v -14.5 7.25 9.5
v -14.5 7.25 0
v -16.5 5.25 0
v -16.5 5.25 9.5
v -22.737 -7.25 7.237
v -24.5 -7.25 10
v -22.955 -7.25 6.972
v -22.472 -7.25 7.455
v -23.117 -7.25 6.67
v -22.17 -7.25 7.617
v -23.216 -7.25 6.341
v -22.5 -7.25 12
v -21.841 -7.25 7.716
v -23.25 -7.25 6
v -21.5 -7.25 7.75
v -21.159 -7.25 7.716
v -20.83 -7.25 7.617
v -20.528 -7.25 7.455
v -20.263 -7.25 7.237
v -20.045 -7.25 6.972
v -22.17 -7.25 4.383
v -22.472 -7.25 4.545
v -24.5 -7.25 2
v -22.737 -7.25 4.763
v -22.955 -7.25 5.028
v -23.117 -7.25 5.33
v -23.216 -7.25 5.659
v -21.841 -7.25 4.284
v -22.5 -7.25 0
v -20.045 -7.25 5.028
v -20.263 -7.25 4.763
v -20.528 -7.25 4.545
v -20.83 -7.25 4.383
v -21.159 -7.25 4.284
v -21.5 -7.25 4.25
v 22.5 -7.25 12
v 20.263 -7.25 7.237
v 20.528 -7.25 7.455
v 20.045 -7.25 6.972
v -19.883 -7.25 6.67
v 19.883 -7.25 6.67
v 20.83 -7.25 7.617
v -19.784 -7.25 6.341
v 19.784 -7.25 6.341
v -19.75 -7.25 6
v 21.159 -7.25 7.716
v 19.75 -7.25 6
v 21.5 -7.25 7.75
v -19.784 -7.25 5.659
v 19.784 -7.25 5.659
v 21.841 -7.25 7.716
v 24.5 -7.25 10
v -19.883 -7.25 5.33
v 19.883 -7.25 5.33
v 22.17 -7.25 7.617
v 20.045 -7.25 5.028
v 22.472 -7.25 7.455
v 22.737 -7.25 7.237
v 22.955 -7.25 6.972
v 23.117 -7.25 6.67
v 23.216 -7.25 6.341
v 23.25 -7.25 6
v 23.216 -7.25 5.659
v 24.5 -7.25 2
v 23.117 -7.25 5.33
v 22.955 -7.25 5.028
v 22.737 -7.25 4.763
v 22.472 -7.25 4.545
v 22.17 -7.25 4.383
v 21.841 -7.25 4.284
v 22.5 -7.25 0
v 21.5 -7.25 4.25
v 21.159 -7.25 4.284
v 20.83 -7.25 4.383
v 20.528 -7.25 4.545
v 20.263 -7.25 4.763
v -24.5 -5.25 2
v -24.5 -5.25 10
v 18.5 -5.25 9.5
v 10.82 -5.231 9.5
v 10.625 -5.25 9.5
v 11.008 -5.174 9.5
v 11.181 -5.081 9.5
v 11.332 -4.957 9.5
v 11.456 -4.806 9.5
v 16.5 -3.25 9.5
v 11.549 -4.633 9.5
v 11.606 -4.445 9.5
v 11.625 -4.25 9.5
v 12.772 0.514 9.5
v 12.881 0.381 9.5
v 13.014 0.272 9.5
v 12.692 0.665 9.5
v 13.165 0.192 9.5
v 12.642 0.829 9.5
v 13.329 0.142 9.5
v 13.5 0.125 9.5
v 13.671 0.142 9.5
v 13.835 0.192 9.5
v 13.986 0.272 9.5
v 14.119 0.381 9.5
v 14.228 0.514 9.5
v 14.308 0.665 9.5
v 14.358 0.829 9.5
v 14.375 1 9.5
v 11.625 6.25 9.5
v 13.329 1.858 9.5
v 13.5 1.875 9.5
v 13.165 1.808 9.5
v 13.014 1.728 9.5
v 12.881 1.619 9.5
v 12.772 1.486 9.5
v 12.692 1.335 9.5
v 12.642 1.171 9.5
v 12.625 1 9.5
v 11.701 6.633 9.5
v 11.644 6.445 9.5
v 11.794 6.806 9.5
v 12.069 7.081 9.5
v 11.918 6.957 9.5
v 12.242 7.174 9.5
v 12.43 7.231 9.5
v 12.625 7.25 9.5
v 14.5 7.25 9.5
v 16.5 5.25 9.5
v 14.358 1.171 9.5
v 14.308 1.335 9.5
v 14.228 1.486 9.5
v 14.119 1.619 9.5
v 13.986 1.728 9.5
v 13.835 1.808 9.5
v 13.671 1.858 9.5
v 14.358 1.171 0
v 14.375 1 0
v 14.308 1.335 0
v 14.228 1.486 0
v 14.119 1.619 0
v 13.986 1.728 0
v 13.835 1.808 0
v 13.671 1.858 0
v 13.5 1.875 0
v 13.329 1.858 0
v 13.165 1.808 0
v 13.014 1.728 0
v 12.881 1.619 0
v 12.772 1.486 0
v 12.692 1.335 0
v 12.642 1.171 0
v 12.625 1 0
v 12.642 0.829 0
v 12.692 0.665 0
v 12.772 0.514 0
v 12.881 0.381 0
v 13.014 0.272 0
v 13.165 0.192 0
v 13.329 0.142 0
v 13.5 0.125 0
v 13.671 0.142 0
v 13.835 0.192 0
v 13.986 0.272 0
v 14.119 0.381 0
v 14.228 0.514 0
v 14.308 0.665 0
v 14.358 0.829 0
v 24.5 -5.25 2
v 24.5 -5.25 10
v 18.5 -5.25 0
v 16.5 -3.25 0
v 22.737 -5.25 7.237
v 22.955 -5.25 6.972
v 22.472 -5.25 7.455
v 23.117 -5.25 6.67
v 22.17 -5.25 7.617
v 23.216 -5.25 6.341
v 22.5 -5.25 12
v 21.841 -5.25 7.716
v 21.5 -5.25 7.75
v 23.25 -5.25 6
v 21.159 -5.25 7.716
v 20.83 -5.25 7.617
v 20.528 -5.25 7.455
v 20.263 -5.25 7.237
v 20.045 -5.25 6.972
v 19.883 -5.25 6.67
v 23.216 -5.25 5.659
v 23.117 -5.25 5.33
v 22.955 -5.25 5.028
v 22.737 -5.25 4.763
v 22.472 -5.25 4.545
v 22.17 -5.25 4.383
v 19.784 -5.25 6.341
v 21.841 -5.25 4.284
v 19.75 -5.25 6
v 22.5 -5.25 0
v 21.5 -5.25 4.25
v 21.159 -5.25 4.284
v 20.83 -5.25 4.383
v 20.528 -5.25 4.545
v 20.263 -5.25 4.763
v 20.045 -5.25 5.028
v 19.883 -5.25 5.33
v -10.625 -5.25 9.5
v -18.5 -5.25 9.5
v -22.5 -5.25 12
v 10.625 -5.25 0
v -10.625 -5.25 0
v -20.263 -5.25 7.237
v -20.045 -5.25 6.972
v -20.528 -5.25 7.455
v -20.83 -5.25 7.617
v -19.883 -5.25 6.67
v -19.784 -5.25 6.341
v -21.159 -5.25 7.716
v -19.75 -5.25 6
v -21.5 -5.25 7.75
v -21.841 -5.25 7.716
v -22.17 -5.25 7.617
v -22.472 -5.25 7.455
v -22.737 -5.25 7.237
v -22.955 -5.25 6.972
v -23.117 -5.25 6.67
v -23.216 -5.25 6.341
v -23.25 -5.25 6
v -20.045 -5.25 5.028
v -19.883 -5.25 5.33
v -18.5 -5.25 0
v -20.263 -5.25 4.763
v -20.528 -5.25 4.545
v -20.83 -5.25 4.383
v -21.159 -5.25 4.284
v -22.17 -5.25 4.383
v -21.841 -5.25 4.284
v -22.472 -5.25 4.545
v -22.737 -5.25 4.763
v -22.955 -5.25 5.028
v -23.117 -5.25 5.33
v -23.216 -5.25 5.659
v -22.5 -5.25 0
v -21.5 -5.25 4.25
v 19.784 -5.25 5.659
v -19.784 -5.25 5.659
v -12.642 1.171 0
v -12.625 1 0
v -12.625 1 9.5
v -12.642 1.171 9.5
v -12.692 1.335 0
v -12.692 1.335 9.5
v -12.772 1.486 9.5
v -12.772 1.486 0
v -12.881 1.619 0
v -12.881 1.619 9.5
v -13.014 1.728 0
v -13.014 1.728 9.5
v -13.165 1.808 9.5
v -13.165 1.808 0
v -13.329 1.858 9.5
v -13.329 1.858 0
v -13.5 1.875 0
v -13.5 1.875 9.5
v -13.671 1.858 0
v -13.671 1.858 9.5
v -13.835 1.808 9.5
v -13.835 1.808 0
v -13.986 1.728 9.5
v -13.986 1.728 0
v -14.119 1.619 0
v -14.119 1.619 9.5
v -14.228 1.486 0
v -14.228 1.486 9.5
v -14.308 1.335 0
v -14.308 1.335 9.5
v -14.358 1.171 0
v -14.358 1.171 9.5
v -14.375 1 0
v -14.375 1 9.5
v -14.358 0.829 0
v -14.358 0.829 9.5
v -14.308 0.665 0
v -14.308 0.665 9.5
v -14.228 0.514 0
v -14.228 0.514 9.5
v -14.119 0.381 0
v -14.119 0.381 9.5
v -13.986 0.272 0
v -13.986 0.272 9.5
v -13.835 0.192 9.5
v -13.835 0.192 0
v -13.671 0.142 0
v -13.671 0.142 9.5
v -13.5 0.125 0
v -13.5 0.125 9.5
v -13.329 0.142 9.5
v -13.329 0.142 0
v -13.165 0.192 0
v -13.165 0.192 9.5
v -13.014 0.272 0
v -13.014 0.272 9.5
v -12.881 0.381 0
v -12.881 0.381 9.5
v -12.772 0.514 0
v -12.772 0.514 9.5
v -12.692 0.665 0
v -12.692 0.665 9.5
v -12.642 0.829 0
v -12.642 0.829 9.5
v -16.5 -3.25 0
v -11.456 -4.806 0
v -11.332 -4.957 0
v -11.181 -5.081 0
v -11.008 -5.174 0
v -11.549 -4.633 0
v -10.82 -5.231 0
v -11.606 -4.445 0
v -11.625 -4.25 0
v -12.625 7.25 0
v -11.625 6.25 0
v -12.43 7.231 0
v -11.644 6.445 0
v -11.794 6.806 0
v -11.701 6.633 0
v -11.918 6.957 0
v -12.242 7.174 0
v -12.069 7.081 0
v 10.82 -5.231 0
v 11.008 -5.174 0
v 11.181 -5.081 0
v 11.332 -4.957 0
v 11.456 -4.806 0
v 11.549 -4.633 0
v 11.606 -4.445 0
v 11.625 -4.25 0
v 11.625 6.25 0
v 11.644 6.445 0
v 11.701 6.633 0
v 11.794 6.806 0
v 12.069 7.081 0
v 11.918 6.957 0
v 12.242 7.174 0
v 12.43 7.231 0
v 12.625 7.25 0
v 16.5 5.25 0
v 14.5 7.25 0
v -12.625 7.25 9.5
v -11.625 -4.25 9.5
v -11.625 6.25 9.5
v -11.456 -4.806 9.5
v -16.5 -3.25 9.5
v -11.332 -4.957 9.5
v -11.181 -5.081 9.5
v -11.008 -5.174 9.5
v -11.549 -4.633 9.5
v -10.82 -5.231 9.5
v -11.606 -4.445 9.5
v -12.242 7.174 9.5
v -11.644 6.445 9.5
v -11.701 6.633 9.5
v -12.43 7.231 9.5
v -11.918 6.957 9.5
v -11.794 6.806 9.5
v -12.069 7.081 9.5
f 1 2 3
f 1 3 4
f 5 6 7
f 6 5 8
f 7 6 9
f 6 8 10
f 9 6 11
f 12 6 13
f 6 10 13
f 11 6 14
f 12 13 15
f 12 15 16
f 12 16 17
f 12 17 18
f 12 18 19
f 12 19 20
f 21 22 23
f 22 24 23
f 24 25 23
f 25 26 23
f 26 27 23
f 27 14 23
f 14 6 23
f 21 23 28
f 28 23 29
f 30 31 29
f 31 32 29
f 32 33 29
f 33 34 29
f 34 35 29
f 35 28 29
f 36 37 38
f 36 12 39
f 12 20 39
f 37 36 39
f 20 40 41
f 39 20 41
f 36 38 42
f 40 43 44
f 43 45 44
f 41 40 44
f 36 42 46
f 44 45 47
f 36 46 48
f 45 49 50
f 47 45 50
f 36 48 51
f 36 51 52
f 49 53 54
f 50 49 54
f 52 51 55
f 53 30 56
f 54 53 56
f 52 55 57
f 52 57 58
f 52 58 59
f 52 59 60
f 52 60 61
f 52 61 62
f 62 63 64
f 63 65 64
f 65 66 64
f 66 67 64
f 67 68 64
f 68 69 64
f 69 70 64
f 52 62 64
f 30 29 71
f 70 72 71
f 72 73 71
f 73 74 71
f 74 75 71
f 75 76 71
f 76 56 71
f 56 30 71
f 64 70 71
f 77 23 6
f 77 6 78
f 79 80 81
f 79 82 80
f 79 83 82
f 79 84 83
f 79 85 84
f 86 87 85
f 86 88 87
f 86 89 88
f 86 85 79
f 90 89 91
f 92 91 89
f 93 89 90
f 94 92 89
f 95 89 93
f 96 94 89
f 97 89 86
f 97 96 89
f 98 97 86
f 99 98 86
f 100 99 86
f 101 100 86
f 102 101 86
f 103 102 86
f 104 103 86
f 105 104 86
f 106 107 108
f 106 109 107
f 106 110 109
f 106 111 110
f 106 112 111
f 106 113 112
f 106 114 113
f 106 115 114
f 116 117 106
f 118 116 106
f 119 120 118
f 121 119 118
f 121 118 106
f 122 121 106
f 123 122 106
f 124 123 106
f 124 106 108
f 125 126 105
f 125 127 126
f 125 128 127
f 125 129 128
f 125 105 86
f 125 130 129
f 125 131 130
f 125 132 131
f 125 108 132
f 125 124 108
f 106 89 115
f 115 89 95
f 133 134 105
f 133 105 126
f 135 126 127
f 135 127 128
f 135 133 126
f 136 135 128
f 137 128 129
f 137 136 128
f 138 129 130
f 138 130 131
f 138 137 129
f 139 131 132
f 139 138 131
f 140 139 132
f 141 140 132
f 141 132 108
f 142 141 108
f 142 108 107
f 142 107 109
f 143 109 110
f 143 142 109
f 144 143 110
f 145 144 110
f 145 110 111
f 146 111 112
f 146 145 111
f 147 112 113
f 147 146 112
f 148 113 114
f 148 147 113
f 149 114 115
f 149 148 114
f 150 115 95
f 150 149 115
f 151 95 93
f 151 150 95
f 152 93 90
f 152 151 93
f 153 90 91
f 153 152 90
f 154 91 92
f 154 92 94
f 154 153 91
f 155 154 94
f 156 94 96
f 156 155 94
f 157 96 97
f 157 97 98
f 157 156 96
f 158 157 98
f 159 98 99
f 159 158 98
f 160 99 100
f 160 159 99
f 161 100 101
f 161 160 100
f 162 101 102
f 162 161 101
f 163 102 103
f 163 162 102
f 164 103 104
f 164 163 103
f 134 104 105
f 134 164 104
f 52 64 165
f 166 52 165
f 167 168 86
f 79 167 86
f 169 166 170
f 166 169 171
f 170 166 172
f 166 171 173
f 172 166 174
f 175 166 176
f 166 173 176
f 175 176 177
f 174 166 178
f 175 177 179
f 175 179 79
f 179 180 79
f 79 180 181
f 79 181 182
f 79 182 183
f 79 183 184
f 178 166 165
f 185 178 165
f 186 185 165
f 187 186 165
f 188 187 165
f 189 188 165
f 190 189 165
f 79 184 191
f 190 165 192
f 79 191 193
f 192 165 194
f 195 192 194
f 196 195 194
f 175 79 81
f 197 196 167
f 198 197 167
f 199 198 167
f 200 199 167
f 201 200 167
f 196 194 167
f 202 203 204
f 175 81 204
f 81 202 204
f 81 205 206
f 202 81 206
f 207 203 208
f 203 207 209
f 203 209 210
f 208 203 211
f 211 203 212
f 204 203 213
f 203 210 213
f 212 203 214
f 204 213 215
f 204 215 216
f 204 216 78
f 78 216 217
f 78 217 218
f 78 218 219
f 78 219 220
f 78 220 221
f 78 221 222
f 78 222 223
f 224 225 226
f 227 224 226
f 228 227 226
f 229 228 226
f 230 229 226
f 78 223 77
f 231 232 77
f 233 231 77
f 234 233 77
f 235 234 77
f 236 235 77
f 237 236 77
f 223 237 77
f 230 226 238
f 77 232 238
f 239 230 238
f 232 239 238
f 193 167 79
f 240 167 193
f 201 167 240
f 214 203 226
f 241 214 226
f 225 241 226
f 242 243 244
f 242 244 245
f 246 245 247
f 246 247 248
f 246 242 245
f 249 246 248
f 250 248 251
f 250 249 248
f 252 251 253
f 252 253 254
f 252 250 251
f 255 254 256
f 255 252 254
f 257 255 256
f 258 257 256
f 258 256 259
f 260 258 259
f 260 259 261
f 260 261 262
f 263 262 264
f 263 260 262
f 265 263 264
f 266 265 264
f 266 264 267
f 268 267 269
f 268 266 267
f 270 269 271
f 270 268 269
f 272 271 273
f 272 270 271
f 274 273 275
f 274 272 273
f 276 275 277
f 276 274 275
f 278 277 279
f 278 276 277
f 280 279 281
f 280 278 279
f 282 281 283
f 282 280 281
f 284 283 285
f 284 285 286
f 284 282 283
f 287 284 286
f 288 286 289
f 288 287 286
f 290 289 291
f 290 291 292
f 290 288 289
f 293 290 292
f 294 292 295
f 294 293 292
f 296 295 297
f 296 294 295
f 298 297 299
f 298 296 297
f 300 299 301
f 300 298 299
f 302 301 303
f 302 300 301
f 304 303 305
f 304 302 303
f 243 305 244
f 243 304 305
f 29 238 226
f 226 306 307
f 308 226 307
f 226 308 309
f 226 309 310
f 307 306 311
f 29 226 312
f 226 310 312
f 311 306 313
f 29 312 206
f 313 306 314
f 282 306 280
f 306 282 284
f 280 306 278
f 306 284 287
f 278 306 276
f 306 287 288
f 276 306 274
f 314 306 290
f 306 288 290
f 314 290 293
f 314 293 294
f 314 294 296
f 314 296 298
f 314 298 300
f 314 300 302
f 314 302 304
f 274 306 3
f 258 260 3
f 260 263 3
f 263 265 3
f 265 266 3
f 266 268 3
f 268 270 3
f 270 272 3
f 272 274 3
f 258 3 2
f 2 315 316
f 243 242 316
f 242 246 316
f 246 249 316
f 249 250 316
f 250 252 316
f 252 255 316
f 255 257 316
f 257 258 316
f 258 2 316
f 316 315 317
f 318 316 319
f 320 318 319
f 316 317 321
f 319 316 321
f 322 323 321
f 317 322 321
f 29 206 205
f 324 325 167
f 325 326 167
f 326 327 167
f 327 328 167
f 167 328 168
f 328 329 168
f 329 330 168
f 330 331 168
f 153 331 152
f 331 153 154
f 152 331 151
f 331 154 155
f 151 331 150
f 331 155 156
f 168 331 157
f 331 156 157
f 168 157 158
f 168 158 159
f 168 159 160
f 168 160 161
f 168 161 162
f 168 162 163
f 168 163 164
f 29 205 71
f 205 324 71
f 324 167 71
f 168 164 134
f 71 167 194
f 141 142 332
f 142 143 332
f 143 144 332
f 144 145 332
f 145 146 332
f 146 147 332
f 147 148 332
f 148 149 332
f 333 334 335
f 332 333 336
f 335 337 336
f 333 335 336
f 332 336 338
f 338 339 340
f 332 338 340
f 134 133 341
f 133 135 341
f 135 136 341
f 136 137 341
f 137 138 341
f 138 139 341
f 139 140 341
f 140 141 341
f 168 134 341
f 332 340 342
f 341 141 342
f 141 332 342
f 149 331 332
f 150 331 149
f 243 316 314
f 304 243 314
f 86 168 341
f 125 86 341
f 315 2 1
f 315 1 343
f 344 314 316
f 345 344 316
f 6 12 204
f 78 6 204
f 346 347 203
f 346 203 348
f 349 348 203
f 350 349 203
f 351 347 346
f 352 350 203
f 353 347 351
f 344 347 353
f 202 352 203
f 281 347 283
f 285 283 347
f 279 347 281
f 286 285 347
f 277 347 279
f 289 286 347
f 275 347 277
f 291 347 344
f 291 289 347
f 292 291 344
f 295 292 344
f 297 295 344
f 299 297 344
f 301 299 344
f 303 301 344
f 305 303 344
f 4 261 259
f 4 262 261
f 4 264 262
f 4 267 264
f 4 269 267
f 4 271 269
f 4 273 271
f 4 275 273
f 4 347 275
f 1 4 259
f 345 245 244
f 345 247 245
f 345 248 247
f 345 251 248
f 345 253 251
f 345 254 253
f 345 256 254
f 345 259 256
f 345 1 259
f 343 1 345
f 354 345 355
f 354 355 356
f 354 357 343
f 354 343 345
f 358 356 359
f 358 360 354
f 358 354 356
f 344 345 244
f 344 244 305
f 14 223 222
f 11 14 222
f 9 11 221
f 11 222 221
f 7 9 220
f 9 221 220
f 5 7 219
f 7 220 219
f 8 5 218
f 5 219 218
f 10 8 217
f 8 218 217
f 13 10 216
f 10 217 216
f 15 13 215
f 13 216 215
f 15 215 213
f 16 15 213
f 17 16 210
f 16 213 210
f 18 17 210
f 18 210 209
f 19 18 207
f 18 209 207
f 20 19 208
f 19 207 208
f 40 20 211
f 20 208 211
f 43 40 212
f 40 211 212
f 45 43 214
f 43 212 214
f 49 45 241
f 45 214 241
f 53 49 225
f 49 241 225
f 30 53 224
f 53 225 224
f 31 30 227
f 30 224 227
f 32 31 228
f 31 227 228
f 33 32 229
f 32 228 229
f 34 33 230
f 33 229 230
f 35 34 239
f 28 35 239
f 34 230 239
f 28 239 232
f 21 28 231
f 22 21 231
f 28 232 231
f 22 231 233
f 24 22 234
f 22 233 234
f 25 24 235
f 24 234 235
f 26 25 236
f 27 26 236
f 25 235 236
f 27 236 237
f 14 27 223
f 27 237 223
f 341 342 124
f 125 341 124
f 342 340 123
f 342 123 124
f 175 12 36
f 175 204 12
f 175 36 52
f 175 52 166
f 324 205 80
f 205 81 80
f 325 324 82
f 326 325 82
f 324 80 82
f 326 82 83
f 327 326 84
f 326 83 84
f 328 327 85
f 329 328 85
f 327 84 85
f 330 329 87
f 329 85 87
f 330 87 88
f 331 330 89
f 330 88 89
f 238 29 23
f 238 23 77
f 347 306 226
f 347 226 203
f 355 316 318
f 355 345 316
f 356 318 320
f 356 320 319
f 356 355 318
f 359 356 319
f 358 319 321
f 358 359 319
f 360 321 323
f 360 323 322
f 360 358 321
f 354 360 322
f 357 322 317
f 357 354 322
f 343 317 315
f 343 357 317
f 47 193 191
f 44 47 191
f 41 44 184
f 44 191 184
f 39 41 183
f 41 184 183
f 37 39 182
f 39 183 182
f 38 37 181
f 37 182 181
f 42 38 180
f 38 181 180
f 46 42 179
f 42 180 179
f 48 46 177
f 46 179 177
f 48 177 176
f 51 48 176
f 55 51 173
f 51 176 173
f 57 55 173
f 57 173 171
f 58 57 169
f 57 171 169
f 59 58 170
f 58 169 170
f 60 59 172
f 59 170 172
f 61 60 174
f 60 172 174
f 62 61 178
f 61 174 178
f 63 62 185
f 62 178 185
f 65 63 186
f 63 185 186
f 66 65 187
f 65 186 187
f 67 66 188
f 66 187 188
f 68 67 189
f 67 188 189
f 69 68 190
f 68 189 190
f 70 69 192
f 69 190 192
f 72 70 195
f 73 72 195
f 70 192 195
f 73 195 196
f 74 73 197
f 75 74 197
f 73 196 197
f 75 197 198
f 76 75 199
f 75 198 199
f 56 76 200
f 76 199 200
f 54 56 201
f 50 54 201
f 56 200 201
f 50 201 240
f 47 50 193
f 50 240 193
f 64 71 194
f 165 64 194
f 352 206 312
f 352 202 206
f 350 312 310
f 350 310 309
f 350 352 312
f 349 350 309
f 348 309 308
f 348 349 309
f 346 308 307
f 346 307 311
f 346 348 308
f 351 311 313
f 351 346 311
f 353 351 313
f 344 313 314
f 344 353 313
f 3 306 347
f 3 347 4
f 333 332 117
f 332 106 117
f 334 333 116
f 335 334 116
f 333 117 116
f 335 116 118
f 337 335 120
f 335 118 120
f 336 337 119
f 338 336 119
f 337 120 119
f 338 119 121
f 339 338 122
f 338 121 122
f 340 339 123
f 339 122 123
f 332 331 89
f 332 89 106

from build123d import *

# Parameters (mm, degrees)
F0_W     = 8
F0_H     = 2
F1_DEPTH = 12
F0_W_2   = 4.875
F0_H_2   = 12.5
F0_R     = 0.875
F2_DEPTH = 9.5
F3_SIZE  = 2
F4_R     = 1.75
F5_DEPTH = 2
F6_R     = 1


with BuildPart() as f1:
    # F0 (on Top) → F1 (new body)
    with BuildSketch(Plane.XY):
        Polygon((-11.625, -5.25), (-16.5, -5.25), (-16.5, -7.25), (16.5, -7.25), (16.5, -5.25), (11.625, -5.25), align=None)
        with Locations((-20.5, -6.25)):
            Rectangle(F0_W, F0_H)
        with Locations((20.5, -6.25)):
            Rectangle(F0_W, F0_H)
    extrude(amount=F1_DEPTH)

    # F0 (on Top) → F2 (join)
    with BuildSketch(Plane.XY):
        with Locations((-14.0625, 1)):
            Rectangle(F0_W_2, F0_H_2)
        with Locations((-13.5, 1)):
            Circle(F0_R, mode=Mode.SUBTRACT)
        with Locations((14.0625, 1)):
            Rectangle(F0_W_2, F0_H_2)
        with Locations((13.5, 1)):
            Circle(F0_R, mode=Mode.SUBTRACT)
    extrude(amount=F2_DEPTH)

    # F3
    f3_edges = [f1.edges().sort_by_distance(p)[0] for p in [
        (-16.5, 7.25, 4.75),
        (16.5, 7.25, 4.75),
        (-24.5, -6.25, 12),
        (-24.5, -6.25, 0),
        (24.5, -6.25, 12),
        (24.5, -6.25, 0),
        (-16.5, -5.25, 4.75),
        (16.5, -5.25, 4.75),
    ]]
    chamfer(f3_edges, length=F3_SIZE)

    # F4 (on face) → F5 (cut, through all)
    with BuildSketch(Plane(origin=(0, -5.25, 0), x_dir=(-1, 0, 0), z_dir=(0, 1, 0))):
        with Locations((21.5, 6)):
            Circle(F4_R)
        with Locations((-21.5, 6)):
            Circle(F4_R)
    extrude(amount=-F5_DEPTH, mode=Mode.SUBTRACT)

    # F6
    f6_edges = [f1.edges().sort_by_distance(p)[0] for p in [
        (11.625, -5.25, 4.75),
        (-11.625, -5.25, 4.75),
        (-11.625, 7.25, 4.75),
        (11.625, 7.25, 4.75),
    ]]
    fillet(f6_edges, radius=F6_R)


solid = f1.part
